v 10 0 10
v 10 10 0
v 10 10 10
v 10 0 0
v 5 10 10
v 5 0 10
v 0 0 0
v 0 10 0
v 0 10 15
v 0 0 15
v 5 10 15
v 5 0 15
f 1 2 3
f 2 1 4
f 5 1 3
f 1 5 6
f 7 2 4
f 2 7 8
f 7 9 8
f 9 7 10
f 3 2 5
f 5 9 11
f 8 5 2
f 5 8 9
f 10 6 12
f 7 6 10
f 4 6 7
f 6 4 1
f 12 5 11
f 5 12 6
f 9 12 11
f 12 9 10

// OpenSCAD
union(fillet = 1) { color("red") cube(10); color("blue") translate([0,0,10]) cube([5,10,5]); }
